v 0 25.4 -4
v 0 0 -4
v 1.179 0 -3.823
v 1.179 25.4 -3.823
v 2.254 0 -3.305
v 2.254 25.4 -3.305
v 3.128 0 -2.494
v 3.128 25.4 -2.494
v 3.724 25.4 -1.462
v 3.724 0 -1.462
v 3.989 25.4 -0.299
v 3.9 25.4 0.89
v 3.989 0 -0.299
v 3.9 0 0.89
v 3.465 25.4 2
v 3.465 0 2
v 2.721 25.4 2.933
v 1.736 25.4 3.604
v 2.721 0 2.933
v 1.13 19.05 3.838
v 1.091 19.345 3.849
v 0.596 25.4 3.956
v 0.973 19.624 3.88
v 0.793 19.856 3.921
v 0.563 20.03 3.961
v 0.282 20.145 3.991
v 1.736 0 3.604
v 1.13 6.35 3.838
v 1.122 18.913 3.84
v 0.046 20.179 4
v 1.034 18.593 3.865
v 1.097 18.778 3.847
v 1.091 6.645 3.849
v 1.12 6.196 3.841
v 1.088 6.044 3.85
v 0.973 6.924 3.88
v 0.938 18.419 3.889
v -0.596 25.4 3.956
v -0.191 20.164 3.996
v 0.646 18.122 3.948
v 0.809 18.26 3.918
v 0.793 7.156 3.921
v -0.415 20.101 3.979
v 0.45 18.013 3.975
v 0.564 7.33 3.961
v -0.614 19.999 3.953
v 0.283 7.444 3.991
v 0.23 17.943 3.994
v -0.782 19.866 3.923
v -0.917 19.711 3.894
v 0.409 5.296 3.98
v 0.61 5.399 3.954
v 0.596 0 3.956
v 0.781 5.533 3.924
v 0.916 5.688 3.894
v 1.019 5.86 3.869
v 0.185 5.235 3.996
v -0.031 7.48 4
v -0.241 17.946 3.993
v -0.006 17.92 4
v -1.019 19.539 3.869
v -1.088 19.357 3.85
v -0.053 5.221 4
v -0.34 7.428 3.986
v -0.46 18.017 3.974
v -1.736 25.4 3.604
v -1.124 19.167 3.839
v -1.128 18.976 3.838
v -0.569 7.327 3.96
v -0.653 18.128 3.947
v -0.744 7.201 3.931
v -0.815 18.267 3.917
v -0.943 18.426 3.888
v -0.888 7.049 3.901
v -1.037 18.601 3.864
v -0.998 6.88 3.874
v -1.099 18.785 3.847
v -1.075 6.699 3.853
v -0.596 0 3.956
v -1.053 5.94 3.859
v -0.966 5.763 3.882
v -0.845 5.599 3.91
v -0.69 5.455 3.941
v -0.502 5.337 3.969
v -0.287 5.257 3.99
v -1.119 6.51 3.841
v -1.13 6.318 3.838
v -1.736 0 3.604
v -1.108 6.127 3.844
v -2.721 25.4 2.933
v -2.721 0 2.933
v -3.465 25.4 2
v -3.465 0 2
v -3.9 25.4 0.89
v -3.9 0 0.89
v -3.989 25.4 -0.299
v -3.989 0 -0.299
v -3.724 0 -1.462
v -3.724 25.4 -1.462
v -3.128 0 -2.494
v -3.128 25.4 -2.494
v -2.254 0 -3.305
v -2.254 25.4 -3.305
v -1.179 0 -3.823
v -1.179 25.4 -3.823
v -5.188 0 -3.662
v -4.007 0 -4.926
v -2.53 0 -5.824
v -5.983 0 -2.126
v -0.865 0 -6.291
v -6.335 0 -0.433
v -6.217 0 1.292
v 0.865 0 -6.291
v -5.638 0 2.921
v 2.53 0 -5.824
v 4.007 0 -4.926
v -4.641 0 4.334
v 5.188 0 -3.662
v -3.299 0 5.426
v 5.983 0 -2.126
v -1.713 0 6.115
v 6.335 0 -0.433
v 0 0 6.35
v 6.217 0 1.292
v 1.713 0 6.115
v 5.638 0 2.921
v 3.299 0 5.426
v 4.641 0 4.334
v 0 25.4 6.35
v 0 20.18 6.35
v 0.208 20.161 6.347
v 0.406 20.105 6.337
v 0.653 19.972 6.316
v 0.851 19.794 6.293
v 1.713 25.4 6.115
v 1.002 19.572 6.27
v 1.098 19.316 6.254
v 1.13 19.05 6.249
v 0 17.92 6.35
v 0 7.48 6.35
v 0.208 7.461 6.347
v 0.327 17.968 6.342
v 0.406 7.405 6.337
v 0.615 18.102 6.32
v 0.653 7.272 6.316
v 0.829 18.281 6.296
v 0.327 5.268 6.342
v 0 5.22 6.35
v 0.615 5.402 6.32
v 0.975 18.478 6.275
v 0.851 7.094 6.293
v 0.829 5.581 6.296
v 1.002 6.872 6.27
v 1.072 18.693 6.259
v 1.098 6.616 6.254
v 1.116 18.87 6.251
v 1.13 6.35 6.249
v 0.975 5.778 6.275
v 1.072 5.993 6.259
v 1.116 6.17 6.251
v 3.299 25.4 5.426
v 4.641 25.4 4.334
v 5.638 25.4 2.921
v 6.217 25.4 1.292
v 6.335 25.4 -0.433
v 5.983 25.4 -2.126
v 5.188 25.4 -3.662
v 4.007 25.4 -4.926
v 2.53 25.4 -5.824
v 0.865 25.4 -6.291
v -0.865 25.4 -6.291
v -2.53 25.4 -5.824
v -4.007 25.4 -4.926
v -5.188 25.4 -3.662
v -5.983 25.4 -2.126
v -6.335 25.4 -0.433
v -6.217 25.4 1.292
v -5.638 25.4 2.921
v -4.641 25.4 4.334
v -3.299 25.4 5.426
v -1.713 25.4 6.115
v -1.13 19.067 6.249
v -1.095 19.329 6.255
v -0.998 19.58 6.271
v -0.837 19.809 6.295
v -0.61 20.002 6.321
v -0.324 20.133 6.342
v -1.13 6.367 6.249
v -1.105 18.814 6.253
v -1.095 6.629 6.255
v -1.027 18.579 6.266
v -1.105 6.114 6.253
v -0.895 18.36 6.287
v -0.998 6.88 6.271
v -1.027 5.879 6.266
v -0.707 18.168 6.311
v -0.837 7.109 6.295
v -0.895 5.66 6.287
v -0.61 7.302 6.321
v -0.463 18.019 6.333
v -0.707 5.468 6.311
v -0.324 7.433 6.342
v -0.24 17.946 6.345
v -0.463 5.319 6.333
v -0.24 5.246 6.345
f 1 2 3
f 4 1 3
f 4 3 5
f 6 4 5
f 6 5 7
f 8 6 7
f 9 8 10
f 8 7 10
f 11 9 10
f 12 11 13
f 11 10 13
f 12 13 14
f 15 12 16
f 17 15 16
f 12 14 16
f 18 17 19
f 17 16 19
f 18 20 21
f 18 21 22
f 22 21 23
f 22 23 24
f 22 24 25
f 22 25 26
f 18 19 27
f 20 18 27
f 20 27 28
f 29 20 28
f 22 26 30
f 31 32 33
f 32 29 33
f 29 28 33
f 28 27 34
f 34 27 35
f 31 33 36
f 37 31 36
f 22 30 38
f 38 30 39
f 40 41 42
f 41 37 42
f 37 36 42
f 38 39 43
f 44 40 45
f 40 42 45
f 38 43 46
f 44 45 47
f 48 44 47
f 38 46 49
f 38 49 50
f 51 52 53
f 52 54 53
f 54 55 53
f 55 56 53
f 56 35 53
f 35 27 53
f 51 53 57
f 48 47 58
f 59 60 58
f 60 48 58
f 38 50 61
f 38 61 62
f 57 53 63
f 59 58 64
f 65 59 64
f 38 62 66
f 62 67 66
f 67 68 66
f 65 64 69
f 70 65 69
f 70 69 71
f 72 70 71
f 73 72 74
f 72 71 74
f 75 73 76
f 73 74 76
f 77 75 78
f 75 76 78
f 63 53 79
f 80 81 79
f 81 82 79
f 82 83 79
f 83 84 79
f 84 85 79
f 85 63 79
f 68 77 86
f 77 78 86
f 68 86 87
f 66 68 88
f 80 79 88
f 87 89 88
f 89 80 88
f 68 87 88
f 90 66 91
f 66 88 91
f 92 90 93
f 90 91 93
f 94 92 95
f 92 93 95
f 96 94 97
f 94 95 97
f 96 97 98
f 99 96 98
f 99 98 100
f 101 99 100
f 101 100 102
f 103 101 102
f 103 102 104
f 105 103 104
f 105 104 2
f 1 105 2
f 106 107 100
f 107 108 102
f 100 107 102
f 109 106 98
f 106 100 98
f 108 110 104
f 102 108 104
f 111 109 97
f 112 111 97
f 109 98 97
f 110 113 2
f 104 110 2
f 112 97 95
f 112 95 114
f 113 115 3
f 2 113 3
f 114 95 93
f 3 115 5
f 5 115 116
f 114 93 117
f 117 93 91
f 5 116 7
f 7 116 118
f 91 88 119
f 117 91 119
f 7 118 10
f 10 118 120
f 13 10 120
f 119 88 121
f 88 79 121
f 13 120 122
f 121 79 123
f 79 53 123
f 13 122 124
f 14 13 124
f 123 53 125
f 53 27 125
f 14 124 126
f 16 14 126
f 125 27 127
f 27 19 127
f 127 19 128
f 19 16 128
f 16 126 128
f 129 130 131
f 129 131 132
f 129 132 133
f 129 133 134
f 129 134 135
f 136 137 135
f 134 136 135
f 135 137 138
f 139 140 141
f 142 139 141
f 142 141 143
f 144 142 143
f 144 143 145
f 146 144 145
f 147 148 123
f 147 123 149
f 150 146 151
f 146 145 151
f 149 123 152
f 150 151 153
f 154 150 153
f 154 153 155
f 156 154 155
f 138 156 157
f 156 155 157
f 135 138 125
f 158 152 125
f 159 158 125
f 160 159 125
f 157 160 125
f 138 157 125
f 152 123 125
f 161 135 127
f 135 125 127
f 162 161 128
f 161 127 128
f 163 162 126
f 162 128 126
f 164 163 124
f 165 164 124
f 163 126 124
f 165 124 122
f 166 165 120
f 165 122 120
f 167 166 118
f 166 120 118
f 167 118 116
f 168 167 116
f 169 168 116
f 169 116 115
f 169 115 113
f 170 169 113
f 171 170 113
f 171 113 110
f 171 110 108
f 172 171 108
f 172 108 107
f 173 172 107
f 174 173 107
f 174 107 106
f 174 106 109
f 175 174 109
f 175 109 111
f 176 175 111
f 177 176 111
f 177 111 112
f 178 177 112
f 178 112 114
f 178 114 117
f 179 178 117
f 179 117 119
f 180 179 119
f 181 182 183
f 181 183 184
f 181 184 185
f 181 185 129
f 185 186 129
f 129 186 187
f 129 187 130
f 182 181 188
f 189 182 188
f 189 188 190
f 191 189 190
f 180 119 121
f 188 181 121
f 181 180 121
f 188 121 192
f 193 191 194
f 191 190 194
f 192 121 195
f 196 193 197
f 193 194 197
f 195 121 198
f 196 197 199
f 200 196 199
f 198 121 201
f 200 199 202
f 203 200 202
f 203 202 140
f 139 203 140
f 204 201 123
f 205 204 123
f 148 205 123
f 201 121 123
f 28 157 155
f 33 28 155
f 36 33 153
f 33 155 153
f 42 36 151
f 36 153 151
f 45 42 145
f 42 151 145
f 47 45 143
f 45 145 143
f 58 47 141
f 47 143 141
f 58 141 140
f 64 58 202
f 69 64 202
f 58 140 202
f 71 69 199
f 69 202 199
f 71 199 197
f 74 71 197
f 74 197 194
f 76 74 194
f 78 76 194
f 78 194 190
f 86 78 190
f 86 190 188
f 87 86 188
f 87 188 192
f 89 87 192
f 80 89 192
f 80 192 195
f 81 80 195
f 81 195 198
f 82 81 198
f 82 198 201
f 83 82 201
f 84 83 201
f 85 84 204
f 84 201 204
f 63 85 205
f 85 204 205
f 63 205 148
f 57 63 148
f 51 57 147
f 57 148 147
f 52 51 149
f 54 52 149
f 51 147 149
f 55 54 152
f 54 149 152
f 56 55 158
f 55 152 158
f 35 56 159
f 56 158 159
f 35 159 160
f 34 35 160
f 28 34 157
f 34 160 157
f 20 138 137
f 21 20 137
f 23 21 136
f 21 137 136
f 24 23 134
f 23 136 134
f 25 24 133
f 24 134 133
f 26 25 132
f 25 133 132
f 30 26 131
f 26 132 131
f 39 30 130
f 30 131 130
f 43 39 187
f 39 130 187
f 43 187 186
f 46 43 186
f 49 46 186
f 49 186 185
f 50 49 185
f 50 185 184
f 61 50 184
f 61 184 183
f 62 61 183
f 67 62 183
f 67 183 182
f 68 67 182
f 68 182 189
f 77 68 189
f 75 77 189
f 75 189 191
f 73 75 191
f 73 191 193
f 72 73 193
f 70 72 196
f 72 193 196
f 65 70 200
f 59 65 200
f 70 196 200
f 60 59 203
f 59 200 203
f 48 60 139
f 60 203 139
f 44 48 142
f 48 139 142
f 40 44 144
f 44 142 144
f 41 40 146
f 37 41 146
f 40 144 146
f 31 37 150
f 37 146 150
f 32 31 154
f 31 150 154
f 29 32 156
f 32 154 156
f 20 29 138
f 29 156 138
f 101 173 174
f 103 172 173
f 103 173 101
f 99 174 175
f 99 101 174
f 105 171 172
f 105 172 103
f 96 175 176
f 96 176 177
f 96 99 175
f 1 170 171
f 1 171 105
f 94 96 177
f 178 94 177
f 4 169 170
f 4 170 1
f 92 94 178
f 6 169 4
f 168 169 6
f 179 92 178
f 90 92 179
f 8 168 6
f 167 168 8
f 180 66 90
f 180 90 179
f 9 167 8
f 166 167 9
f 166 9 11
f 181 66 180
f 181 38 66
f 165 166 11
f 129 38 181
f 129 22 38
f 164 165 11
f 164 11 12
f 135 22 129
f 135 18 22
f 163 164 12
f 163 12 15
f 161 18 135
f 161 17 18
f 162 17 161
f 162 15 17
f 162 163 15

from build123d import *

# Parameters (mm, degrees)
SKETCH1_R               = 6.35
BOSS_EXTRUDE1_DEPTH     = 25.4
CUT_EXTRUDE2_DEPTH      = 27.940768363
CUT_EXTRUDE2_DEPTH_BACK = 12.7
SKETCH3_R               = 4
SKETCH6_R               = 4.0005
CUT_EXTRUDE5_DEPTH      = 27.940768363
CUT_EXTRUDE3_REACH      = 31.099
CUT_EXTRUDE3_END_RADIUS = 4.0005
SKETCH4_R               = 1.1303


with BuildPart() as part:
    # Sketch1 → Boss-Extrude1 (new body)
    with BuildSketch(Plane(origin=(0, 0, 0), x_dir=(1, 0, 0), z_dir=(0, 1, 0))):
        with Locations(Location((0, 0, 0), (0, 0, 270))):
            Circle(SKETCH1_R)
    extrude(amount=BOSS_EXTRUDE1_DEPTH)

    # Sketch3 → Cut-Extrude2 (cut, two sides: drawn at the far end of the back side and taken through both)
    with BuildSketch(Plane.XZ.offset(-CUT_EXTRUDE2_DEPTH_BACK)):
        with Locations(Location((0, 0, 0), (0, 0, 90))):
            Circle(SKETCH3_R)
    extrude(amount=CUT_EXTRUDE2_DEPTH + CUT_EXTRUDE2_DEPTH_BACK, mode=Mode.SUBTRACT)

    # Sketch6 → Cut-Extrude5 (cut, through all)
    with BuildSketch(Plane(origin=(0, 0, 0), x_dir=(-1, 0, 0), z_dir=(0, -1, 0))):
        with Locations(Location((0, 0, 0), (0, 0, 90))):
            Circle(SKETCH6_R)
    extrude(amount=-CUT_EXTRUDE5_DEPTH, mode=Mode.SUBTRACT)

    # Cut-Extrude3: up to this cylinder (the profile starts outside it)
    cut_extrude3_end = Plane(origin=(0, 12.7, 0), z_dir=(0, -1, 0)) * Cylinder(CUT_EXTRUDE3_END_RADIUS, 83.899, mode=Mode.PRIVATE)
    # Sketch4 → Cut-Extrude3 (cut, up to the surface)
    with BuildSketch(Plane.XY.offset(6.35), mode=Mode.PRIVATE) as cut_extrude3_sk1:
        with Locations((0, 6.35)):
            Circle(SKETCH4_R)
    cut_extrude3_tool1 = extrude(cut_extrude3_sk1.sketch, amount=-CUT_EXTRUDE3_REACH, mode=Mode.PRIVATE) - cut_extrude3_end
    add(cut_extrude3_tool1.solids().sort_by_distance((0, 6.35, 6.35))[0], mode=Mode.SUBTRACT)
    # Sketch4 → Cut-Extrude3 (cut, up to the surface)
    with BuildSketch(Plane.XY.offset(6.35), mode=Mode.PRIVATE) as cut_extrude3_sk2:
        with Locations((0, 19.05)):
            Circle(SKETCH4_R)
    cut_extrude3_tool2 = extrude(cut_extrude3_sk2.sketch, amount=-CUT_EXTRUDE3_REACH, mode=Mode.PRIVATE) - cut_extrude3_end
    add(cut_extrude3_tool2.solids().sort_by_distance((0, 19.05, 6.35))[0], mode=Mode.SUBTRACT)


solid = part.part
